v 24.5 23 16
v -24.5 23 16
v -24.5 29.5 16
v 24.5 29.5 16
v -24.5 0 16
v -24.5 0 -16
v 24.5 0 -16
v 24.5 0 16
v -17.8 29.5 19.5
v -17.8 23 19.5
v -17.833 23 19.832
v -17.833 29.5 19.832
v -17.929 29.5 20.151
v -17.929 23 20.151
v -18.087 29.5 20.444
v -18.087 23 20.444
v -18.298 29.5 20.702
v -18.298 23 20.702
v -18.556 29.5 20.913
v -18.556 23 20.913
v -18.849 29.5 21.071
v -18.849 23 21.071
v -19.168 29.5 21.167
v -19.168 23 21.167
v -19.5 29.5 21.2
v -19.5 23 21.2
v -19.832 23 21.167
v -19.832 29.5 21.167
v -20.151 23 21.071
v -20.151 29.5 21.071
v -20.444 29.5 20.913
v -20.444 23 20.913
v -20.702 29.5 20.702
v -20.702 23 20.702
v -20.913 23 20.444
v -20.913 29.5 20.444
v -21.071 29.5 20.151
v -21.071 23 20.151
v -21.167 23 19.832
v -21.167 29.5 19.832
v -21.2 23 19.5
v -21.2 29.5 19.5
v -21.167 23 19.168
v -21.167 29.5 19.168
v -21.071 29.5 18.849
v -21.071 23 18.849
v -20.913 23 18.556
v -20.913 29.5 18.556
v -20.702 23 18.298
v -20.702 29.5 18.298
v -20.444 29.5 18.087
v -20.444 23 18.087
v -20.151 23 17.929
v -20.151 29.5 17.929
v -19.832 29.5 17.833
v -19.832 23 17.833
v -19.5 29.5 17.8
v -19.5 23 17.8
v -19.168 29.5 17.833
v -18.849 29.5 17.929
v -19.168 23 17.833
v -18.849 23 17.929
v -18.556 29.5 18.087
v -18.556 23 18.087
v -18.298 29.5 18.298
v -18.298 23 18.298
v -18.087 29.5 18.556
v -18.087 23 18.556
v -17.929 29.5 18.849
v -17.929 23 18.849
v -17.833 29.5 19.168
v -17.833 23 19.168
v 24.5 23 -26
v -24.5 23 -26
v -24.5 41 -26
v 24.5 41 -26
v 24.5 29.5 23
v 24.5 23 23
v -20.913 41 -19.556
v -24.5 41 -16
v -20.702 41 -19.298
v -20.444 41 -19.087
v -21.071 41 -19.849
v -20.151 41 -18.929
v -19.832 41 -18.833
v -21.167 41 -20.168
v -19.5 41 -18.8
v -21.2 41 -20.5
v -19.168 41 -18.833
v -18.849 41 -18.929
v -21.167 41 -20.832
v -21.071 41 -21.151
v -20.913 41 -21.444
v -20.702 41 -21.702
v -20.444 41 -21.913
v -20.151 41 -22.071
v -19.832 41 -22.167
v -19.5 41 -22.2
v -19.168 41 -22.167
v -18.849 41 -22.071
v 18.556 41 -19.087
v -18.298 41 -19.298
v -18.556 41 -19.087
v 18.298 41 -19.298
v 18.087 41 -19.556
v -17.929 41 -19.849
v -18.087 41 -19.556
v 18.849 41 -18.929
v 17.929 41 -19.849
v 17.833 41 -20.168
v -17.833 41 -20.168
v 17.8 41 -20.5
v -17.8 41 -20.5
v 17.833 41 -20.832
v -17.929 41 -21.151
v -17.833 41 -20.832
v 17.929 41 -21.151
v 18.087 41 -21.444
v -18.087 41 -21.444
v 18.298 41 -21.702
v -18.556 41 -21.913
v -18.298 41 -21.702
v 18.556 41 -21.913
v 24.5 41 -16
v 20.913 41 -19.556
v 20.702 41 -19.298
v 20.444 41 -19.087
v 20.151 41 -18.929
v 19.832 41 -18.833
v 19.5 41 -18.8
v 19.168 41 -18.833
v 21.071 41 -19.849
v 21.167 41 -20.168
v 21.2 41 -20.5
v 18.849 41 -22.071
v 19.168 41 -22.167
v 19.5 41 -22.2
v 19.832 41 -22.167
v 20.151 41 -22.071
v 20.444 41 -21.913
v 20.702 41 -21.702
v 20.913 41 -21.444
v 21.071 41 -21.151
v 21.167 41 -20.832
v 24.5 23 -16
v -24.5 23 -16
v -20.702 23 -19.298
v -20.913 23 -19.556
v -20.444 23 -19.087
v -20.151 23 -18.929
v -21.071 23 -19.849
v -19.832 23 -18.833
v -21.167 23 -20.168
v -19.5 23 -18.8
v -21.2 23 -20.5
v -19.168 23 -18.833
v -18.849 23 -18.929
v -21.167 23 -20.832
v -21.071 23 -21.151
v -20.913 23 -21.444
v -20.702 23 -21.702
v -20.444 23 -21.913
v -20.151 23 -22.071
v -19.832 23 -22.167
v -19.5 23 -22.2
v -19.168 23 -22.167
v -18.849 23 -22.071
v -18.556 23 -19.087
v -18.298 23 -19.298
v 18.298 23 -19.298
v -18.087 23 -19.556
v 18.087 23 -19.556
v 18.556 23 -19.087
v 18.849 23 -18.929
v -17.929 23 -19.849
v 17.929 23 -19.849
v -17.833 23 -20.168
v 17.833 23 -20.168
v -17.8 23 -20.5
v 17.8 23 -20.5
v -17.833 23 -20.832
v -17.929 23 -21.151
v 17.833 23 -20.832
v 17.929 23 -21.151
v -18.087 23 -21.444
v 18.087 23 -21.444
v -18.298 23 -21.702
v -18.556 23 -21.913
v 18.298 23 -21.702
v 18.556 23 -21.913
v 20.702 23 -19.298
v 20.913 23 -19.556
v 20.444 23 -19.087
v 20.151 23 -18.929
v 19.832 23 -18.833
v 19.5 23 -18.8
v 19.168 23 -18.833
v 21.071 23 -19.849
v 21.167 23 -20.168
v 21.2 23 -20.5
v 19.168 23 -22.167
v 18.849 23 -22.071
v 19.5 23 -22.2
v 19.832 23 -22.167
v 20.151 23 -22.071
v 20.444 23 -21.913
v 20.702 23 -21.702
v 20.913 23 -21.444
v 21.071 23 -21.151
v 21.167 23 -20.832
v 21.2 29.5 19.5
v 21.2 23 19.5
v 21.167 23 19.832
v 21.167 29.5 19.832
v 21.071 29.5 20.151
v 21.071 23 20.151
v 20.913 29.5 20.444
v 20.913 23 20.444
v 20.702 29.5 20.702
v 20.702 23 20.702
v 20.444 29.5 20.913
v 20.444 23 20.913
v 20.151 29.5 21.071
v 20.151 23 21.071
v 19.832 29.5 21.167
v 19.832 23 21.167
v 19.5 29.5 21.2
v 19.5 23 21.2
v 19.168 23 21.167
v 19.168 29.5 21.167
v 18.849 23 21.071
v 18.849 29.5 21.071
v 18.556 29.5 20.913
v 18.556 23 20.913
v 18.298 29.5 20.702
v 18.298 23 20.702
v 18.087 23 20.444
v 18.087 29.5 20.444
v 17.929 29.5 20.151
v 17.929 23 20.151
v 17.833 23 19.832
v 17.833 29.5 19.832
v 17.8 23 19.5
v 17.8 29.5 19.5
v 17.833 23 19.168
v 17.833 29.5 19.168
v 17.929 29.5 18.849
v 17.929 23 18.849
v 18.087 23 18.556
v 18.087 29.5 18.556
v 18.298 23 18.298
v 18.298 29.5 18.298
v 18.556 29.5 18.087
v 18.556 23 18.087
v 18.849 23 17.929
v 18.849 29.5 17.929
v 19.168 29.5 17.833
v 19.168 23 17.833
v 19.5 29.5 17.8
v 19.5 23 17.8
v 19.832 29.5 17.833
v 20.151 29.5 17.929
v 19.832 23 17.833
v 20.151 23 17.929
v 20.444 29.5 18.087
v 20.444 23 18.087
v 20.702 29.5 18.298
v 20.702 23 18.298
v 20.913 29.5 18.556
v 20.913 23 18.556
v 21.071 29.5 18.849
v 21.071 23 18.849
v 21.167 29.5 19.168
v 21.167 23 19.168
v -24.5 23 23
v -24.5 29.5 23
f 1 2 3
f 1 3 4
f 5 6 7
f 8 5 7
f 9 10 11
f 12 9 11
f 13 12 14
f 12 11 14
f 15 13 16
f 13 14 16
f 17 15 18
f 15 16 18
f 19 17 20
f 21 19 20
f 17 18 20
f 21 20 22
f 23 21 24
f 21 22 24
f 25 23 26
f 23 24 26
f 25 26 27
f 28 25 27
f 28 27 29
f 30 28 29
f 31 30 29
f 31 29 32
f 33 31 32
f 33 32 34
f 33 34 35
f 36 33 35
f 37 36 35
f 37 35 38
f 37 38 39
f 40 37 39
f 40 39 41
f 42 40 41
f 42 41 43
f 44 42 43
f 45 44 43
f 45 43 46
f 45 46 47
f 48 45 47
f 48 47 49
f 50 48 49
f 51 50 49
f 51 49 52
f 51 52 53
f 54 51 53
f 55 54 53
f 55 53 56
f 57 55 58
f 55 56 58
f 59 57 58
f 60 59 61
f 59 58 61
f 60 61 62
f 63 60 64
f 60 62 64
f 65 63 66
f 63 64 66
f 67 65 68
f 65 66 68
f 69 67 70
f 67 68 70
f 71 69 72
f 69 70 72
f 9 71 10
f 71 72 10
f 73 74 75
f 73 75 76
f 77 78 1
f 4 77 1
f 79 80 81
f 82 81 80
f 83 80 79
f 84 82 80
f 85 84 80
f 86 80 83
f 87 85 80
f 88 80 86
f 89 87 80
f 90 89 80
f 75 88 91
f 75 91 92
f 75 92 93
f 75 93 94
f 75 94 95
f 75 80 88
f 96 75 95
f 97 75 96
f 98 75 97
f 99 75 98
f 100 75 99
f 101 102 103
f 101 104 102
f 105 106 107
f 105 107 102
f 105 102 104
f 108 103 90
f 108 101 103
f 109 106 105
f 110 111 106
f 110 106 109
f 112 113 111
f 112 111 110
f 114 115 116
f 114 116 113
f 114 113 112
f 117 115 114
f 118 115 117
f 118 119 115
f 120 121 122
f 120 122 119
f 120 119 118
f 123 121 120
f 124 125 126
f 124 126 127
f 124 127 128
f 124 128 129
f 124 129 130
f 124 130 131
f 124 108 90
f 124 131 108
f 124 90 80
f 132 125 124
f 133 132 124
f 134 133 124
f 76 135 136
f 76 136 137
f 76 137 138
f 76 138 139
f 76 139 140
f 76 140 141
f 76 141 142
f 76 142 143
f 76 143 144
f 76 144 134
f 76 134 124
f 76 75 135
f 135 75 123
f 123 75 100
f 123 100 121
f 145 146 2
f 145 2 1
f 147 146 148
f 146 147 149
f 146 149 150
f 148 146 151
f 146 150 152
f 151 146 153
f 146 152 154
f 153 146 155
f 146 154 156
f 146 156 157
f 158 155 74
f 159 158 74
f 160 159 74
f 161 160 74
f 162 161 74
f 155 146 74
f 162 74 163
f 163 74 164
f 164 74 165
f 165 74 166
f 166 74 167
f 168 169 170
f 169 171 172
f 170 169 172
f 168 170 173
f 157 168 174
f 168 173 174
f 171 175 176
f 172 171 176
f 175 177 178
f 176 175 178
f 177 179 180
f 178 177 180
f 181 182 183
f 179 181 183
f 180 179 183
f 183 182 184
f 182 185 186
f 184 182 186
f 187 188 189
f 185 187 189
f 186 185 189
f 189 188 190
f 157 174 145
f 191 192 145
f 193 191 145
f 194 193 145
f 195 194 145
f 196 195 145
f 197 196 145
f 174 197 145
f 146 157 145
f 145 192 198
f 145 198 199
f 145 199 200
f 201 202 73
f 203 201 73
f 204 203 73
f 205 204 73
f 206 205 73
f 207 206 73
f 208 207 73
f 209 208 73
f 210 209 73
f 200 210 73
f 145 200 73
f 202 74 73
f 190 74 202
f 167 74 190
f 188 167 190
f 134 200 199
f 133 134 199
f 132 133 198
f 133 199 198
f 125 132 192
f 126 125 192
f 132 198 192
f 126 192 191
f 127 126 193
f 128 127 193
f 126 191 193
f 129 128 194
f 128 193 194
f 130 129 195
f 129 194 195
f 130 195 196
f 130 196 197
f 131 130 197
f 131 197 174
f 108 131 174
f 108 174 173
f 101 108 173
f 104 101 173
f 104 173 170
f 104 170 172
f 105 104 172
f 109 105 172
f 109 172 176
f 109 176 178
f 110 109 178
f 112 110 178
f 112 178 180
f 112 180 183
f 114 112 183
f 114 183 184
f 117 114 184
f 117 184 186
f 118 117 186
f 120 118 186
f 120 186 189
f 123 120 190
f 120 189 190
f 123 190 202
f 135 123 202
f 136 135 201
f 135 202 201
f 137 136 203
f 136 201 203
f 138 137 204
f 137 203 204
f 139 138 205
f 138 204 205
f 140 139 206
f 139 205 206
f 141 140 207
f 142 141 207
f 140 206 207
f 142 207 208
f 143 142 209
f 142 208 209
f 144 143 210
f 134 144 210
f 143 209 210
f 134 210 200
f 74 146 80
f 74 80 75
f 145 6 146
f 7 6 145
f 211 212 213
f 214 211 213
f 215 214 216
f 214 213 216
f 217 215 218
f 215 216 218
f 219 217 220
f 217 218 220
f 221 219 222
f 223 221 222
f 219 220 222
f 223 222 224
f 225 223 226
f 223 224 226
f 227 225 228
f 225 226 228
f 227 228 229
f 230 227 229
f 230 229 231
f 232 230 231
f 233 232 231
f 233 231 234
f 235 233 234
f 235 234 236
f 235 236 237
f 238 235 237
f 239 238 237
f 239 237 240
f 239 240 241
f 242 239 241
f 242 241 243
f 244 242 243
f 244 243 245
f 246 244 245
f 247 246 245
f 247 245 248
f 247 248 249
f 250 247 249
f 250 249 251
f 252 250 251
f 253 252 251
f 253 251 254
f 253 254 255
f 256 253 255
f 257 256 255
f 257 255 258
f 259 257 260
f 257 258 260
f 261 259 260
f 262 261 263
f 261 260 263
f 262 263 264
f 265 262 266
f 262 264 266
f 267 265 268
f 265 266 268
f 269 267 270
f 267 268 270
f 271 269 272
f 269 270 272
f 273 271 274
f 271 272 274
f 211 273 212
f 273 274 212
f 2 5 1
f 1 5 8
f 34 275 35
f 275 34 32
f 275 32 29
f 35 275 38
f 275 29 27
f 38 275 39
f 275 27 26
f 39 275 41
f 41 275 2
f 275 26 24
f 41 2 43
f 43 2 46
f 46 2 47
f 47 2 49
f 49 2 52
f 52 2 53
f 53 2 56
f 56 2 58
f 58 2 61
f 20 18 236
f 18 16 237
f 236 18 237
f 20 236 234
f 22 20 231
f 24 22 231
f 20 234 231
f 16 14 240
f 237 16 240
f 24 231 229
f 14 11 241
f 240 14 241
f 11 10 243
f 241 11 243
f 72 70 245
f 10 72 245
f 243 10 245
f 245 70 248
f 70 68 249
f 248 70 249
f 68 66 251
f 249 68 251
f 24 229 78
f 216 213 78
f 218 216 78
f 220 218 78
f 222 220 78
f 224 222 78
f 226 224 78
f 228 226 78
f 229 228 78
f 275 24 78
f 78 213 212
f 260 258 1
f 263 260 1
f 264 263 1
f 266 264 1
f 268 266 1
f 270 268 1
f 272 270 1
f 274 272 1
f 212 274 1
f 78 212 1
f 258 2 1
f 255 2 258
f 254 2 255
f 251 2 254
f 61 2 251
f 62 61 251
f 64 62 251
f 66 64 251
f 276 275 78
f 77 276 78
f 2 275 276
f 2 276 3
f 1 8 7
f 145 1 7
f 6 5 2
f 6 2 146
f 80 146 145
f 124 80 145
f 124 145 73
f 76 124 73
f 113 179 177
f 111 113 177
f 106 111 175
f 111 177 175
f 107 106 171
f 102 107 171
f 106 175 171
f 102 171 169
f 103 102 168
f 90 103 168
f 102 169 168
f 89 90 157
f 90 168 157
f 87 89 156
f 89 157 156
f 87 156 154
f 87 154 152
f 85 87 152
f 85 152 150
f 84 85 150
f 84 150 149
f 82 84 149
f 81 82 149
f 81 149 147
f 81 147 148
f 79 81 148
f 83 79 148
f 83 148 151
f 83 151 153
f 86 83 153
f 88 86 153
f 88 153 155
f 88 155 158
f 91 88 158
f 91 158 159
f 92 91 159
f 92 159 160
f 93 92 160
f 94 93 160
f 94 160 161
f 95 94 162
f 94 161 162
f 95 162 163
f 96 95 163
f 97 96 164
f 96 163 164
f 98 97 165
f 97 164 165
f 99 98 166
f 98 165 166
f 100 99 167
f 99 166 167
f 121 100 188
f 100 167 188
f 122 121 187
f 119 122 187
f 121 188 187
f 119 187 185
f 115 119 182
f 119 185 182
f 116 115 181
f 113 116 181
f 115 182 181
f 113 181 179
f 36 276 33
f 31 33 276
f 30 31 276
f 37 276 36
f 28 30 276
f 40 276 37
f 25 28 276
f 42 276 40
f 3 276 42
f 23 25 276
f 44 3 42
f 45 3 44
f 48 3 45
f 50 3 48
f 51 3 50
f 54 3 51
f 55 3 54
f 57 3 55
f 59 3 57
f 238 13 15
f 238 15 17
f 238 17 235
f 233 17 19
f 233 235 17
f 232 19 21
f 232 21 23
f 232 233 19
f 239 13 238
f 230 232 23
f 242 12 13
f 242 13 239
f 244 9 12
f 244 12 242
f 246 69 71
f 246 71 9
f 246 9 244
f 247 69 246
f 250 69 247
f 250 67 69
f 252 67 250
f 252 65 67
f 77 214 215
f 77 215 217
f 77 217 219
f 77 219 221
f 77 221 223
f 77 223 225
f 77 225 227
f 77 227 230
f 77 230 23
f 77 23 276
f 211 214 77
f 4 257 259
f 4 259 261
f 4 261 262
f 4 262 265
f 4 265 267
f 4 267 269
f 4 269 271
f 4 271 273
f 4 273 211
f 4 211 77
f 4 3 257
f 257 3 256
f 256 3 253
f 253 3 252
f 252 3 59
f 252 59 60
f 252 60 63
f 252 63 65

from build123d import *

# Parameters (mm, degrees)
SKETCH_1_W          = 49
SKETCH_1_H          = 32
EXTRUDE_1_DEPTH     = 23
SKETCH_7_W          = 49
SKETCH_7_H          = 7
EXTRUDE_4_DEPTH     = 6.5
SKETCH_8_W          = 49
SKETCH_8_H          = 10
EXTRUDE_5_DEPTH     = 18
SKETCH_10_R         = 1.7
CUT_EXTRUDE_1_DEPTH = 19
SKETCH_11_R         = 1.7
CUT_EXTRUDE_2_DEPTH = 19


with BuildPart() as part:
    # 草圖1 → 填料-伸長1 (new body)
    with BuildSketch(Plane(origin=(0, 0, 0), x_dir=(1, 0, 0), z_dir=(0, 1, 0))):
        Rectangle(SKETCH_1_W, SKETCH_1_H)
    extrude(amount=EXTRUDE_1_DEPTH)


with BuildPart() as body_2:
    # 草圖7 → 填料-伸長4 (new body)
    with BuildSketch(Plane(origin=(0, 23, 0), x_dir=(1, 0, 0), z_dir=(0, 1, 0))):
        with Locations((0, -19.5)):
            Rectangle(SKETCH_7_W, SKETCH_7_H)
    extrude(amount=EXTRUDE_4_DEPTH)

    # 草圖11 → 除料-伸長2 (cut, through all)
    with BuildSketch(Plane.XZ.offset(-23)):
        with Locations((19.5, 19.5)):
            Circle(SKETCH_11_R)
        with Locations((-19.5, 19.5)):
            Circle(SKETCH_11_R)
    extrude(amount=-CUT_EXTRUDE_2_DEPTH, mode=Mode.SUBTRACT)


with BuildPart() as body_3:
    # 草圖8 → 填料-伸長5 (new body)
    with BuildSketch(Plane(origin=(0, 23, 0), x_dir=(1, 0, 0), z_dir=(0, 1, 0))):
        with Locations((0, 21)):
            Rectangle(SKETCH_8_W, SKETCH_8_H)
    extrude(amount=EXTRUDE_5_DEPTH)

    # 草圖10 → 除料-伸長1 (cut, through all)
    with BuildSketch(Plane.XZ.offset(-23)):
        with Locations((-19.5, -20.5)):
            Circle(SKETCH_10_R)
        with Locations((19.5, -20.5)):
            Circle(SKETCH_10_R)
    extrude(amount=-CUT_EXTRUDE_1_DEPTH, mode=Mode.SUBTRACT)


solid = Compound([part.part, body_2.part, body_3.part])
